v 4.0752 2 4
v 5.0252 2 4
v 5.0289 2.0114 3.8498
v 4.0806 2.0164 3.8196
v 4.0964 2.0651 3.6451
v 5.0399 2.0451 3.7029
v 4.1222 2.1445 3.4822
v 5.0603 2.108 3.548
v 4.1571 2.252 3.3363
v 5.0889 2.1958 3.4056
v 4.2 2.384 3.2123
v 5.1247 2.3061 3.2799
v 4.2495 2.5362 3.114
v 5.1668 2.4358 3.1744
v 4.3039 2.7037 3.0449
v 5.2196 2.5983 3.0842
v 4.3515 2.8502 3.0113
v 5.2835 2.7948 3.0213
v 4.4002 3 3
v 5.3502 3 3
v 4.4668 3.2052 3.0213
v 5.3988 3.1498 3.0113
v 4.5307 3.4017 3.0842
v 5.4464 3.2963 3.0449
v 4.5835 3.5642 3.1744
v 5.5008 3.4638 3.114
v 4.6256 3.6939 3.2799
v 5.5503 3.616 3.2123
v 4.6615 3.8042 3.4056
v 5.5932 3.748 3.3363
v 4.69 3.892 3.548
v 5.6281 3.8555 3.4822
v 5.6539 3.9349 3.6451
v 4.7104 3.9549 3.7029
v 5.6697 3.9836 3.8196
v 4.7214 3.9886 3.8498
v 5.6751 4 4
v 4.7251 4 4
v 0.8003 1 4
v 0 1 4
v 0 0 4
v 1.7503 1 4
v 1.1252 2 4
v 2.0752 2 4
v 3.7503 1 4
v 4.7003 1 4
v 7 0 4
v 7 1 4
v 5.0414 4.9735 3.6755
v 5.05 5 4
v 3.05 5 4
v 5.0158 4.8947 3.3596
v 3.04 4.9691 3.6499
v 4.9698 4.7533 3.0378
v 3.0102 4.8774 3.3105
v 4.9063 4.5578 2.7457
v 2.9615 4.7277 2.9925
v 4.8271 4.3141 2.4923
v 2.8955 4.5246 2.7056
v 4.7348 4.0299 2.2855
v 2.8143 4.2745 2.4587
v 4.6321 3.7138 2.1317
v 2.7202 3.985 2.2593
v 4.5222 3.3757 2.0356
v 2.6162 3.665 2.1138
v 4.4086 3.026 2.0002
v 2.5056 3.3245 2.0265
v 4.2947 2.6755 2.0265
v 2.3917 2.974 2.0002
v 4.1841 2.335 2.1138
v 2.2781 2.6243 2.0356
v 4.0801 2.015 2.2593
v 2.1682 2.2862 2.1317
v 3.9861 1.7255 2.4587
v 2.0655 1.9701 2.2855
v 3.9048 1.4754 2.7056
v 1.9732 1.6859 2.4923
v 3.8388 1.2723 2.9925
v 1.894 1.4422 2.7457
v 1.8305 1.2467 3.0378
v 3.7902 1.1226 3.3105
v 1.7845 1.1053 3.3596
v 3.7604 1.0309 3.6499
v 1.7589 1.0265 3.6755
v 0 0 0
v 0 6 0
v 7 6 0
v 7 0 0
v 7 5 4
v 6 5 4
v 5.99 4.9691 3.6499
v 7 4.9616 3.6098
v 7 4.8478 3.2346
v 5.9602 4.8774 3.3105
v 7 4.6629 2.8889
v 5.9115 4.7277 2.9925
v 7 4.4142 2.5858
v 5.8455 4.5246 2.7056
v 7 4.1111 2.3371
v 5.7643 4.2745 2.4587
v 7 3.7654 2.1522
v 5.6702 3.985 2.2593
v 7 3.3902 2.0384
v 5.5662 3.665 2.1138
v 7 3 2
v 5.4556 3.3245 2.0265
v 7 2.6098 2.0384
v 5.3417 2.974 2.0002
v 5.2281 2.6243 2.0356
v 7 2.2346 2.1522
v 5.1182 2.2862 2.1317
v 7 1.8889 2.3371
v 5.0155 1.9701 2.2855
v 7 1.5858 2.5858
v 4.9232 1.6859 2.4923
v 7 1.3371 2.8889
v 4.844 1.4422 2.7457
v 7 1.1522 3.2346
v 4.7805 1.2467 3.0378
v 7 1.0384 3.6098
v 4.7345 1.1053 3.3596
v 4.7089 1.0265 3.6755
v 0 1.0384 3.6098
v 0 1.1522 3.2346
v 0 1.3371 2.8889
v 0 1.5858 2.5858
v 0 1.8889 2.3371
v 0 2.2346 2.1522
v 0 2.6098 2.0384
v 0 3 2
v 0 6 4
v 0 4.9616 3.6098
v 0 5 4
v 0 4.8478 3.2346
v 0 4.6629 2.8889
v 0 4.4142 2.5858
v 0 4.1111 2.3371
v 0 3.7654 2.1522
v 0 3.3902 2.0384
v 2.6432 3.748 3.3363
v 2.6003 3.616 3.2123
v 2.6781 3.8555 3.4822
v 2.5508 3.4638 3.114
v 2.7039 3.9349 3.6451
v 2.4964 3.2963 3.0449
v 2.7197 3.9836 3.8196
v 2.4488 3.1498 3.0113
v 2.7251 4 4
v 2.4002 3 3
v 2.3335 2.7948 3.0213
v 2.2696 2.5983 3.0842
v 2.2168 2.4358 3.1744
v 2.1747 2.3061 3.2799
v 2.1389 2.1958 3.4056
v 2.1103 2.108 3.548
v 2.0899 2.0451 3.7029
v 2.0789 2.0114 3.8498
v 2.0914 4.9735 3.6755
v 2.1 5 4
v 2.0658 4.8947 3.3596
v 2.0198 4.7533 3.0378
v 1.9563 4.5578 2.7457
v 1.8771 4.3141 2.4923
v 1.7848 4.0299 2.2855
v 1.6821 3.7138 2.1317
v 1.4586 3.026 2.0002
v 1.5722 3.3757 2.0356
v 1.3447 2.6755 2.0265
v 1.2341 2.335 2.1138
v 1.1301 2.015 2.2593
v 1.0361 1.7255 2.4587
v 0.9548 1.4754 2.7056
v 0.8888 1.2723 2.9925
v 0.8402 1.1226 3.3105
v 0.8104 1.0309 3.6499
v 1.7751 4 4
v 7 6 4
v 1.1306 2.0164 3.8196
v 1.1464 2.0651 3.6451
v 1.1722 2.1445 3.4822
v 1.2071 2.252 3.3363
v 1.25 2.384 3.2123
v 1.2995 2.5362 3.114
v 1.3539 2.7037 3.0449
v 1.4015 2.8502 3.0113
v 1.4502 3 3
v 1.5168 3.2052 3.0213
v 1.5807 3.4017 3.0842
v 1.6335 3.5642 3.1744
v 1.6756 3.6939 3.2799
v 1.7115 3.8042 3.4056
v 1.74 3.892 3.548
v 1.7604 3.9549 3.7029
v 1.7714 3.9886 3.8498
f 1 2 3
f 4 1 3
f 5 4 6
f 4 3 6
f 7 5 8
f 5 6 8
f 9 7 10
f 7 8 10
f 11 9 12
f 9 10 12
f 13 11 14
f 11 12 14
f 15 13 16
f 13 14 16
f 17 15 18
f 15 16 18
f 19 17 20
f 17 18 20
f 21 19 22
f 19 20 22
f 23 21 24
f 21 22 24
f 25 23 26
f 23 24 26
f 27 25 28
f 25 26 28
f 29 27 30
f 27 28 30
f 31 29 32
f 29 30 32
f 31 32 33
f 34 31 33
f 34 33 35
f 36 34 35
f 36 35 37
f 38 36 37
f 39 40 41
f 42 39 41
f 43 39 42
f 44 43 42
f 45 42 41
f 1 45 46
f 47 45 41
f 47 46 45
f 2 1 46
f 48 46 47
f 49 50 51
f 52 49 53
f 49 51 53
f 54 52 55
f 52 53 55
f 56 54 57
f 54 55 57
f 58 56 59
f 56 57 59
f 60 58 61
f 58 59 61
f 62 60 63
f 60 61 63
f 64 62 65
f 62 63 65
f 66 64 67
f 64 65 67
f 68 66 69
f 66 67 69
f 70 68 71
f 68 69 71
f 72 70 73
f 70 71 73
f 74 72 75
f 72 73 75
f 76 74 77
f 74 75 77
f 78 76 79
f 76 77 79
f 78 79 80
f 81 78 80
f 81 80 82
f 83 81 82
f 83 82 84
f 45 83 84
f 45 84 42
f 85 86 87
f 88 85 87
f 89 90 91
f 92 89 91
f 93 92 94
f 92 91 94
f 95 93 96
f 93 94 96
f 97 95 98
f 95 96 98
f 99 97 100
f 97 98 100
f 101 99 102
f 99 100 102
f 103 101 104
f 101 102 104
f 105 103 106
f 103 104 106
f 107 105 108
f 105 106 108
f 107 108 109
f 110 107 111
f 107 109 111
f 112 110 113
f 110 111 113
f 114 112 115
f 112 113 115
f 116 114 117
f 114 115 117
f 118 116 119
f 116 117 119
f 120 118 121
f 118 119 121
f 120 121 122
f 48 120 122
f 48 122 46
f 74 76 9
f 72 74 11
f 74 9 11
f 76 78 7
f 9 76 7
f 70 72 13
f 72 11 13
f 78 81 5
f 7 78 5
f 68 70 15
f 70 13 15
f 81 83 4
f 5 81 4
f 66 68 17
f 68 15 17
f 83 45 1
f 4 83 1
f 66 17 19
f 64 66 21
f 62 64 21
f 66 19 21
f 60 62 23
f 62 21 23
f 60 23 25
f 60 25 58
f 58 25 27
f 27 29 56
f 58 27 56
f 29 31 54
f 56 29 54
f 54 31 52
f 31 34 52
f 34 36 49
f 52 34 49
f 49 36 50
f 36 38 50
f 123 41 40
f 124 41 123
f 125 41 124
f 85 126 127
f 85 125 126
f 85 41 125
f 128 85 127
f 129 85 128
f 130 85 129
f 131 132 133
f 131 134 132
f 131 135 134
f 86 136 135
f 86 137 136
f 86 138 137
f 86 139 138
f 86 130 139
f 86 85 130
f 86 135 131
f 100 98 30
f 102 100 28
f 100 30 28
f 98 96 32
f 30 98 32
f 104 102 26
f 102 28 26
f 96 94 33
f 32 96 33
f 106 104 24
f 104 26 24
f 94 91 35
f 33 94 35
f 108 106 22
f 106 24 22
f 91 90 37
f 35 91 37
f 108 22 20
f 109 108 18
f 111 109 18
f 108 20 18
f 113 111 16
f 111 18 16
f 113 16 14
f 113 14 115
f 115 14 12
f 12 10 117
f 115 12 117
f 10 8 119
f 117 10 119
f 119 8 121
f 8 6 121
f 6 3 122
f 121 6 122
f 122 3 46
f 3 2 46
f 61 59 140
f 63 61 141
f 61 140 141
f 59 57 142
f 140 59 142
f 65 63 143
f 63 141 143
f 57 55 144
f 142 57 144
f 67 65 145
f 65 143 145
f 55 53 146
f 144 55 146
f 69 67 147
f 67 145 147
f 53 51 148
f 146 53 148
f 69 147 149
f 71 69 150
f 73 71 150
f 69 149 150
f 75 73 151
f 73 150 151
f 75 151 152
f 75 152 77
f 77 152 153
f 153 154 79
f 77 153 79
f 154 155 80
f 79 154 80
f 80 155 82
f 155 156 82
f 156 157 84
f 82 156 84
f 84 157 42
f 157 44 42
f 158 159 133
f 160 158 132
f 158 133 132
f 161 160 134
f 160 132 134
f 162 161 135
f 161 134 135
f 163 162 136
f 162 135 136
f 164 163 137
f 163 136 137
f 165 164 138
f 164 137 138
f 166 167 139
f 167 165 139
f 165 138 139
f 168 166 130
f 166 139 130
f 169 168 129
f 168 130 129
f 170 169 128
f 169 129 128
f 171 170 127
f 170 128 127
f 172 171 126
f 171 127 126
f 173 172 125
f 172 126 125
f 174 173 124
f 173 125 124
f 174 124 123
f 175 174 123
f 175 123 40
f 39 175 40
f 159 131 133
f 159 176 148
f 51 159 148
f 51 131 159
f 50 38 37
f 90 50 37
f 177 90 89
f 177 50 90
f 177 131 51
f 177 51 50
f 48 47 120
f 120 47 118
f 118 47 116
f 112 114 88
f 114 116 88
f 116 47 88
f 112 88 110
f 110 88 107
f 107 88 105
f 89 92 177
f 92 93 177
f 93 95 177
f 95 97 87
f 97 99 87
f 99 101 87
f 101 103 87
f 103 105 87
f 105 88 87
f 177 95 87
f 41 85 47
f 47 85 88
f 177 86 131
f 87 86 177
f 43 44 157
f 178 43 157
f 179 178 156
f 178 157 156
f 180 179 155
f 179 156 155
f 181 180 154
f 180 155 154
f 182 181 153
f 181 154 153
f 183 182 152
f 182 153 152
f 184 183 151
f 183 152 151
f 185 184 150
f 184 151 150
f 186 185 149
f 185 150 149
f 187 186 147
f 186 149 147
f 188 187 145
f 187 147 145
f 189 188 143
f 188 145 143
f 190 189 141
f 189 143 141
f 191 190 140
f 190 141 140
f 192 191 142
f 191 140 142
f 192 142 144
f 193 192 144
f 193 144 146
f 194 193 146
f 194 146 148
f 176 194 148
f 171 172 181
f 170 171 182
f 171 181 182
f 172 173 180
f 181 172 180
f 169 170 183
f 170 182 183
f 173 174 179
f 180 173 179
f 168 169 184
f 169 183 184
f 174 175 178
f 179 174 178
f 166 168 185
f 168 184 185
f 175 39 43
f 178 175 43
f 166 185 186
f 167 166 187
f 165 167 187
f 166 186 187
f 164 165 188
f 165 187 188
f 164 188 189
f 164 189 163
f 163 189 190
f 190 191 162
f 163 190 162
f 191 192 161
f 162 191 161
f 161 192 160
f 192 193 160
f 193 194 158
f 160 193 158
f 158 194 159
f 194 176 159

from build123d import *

# Parameters (mm, degrees)
SKETCH_1_W          = 7
SKETCH_1_H          = 6
EXTRUDE_1_DEPTH     = 4
SKETCH_2_R          = 2
CUT_EXTRUDE_1_DEPTH = 11.049875621
EXTRUDE_2_REACH     = 12.05
SKETCH_7_R          = 1
CUT_EXTRUDE_3_DEPTH = 11.049875621


with BuildPart() as part:
    # 草图1 → 凸台-拉伸1 (new body)
    with BuildSketch(Plane.XY):
        with Locations((3.5, 3)):
            Rectangle(SKETCH_1_W, SKETCH_1_H)
    extrude(amount=EXTRUDE_1_DEPTH)

    # 草图2 → 切除-拉伸1 (cut, through all)
    with BuildSketch(Plane.ZY):
        with Locations((4, 3)):
            Circle(SKETCH_2_R)
    extrude(amount=-CUT_EXTRUDE_1_DEPTH, mode=Mode.SUBTRACT)

    # 草图6 → 凸台-拉伸2 (add, up to next)
    with BuildSketch(Plane.XY.offset(4), mode=Mode.PRIVATE) as extrude_2_sk1:
        Polygon((5.05, 5), (6, 5), (4.700321215, 1), (3.750321215, 1), align=None)
    extrude_2_tool1 = extrude(extrude_2_sk1.sketch, amount=-EXTRUDE_2_REACH, mode=Mode.PRIVATE) - part.part
    # 草图6 → 凸台-拉伸2 (add, up to next)
    with BuildSketch(Plane.XY.offset(4), mode=Mode.PRIVATE) as extrude_2_sk2:
        Polygon((2.1, 5), (3.05, 5), (1.750321215, 1), (0.800321215, 1), align=None)
    extrude_2_tool2 = extrude(extrude_2_sk2.sketch, amount=-EXTRUDE_2_REACH, mode=Mode.PRIVATE) - part.part
    add(extrude_2_tool1.solids().sort_by_distance((4.875161, 3, 4))[0])
    add(extrude_2_tool2.solids().sort_by_distance((1.925161, 3, 4))[0])

    # 草图7 → 切除-拉伸3 (cut, through all)
    with BuildSketch(Plane(origin=(7, 0, 0), x_dir=(0, 0, -1), z_dir=(1, 0, 0))):
        with Locations((-4, 3)):
            Circle(SKETCH_7_R)
    extrude(amount=-CUT_EXTRUDE_3_DEPTH, mode=Mode.SUBTRACT)


solid = part.part
